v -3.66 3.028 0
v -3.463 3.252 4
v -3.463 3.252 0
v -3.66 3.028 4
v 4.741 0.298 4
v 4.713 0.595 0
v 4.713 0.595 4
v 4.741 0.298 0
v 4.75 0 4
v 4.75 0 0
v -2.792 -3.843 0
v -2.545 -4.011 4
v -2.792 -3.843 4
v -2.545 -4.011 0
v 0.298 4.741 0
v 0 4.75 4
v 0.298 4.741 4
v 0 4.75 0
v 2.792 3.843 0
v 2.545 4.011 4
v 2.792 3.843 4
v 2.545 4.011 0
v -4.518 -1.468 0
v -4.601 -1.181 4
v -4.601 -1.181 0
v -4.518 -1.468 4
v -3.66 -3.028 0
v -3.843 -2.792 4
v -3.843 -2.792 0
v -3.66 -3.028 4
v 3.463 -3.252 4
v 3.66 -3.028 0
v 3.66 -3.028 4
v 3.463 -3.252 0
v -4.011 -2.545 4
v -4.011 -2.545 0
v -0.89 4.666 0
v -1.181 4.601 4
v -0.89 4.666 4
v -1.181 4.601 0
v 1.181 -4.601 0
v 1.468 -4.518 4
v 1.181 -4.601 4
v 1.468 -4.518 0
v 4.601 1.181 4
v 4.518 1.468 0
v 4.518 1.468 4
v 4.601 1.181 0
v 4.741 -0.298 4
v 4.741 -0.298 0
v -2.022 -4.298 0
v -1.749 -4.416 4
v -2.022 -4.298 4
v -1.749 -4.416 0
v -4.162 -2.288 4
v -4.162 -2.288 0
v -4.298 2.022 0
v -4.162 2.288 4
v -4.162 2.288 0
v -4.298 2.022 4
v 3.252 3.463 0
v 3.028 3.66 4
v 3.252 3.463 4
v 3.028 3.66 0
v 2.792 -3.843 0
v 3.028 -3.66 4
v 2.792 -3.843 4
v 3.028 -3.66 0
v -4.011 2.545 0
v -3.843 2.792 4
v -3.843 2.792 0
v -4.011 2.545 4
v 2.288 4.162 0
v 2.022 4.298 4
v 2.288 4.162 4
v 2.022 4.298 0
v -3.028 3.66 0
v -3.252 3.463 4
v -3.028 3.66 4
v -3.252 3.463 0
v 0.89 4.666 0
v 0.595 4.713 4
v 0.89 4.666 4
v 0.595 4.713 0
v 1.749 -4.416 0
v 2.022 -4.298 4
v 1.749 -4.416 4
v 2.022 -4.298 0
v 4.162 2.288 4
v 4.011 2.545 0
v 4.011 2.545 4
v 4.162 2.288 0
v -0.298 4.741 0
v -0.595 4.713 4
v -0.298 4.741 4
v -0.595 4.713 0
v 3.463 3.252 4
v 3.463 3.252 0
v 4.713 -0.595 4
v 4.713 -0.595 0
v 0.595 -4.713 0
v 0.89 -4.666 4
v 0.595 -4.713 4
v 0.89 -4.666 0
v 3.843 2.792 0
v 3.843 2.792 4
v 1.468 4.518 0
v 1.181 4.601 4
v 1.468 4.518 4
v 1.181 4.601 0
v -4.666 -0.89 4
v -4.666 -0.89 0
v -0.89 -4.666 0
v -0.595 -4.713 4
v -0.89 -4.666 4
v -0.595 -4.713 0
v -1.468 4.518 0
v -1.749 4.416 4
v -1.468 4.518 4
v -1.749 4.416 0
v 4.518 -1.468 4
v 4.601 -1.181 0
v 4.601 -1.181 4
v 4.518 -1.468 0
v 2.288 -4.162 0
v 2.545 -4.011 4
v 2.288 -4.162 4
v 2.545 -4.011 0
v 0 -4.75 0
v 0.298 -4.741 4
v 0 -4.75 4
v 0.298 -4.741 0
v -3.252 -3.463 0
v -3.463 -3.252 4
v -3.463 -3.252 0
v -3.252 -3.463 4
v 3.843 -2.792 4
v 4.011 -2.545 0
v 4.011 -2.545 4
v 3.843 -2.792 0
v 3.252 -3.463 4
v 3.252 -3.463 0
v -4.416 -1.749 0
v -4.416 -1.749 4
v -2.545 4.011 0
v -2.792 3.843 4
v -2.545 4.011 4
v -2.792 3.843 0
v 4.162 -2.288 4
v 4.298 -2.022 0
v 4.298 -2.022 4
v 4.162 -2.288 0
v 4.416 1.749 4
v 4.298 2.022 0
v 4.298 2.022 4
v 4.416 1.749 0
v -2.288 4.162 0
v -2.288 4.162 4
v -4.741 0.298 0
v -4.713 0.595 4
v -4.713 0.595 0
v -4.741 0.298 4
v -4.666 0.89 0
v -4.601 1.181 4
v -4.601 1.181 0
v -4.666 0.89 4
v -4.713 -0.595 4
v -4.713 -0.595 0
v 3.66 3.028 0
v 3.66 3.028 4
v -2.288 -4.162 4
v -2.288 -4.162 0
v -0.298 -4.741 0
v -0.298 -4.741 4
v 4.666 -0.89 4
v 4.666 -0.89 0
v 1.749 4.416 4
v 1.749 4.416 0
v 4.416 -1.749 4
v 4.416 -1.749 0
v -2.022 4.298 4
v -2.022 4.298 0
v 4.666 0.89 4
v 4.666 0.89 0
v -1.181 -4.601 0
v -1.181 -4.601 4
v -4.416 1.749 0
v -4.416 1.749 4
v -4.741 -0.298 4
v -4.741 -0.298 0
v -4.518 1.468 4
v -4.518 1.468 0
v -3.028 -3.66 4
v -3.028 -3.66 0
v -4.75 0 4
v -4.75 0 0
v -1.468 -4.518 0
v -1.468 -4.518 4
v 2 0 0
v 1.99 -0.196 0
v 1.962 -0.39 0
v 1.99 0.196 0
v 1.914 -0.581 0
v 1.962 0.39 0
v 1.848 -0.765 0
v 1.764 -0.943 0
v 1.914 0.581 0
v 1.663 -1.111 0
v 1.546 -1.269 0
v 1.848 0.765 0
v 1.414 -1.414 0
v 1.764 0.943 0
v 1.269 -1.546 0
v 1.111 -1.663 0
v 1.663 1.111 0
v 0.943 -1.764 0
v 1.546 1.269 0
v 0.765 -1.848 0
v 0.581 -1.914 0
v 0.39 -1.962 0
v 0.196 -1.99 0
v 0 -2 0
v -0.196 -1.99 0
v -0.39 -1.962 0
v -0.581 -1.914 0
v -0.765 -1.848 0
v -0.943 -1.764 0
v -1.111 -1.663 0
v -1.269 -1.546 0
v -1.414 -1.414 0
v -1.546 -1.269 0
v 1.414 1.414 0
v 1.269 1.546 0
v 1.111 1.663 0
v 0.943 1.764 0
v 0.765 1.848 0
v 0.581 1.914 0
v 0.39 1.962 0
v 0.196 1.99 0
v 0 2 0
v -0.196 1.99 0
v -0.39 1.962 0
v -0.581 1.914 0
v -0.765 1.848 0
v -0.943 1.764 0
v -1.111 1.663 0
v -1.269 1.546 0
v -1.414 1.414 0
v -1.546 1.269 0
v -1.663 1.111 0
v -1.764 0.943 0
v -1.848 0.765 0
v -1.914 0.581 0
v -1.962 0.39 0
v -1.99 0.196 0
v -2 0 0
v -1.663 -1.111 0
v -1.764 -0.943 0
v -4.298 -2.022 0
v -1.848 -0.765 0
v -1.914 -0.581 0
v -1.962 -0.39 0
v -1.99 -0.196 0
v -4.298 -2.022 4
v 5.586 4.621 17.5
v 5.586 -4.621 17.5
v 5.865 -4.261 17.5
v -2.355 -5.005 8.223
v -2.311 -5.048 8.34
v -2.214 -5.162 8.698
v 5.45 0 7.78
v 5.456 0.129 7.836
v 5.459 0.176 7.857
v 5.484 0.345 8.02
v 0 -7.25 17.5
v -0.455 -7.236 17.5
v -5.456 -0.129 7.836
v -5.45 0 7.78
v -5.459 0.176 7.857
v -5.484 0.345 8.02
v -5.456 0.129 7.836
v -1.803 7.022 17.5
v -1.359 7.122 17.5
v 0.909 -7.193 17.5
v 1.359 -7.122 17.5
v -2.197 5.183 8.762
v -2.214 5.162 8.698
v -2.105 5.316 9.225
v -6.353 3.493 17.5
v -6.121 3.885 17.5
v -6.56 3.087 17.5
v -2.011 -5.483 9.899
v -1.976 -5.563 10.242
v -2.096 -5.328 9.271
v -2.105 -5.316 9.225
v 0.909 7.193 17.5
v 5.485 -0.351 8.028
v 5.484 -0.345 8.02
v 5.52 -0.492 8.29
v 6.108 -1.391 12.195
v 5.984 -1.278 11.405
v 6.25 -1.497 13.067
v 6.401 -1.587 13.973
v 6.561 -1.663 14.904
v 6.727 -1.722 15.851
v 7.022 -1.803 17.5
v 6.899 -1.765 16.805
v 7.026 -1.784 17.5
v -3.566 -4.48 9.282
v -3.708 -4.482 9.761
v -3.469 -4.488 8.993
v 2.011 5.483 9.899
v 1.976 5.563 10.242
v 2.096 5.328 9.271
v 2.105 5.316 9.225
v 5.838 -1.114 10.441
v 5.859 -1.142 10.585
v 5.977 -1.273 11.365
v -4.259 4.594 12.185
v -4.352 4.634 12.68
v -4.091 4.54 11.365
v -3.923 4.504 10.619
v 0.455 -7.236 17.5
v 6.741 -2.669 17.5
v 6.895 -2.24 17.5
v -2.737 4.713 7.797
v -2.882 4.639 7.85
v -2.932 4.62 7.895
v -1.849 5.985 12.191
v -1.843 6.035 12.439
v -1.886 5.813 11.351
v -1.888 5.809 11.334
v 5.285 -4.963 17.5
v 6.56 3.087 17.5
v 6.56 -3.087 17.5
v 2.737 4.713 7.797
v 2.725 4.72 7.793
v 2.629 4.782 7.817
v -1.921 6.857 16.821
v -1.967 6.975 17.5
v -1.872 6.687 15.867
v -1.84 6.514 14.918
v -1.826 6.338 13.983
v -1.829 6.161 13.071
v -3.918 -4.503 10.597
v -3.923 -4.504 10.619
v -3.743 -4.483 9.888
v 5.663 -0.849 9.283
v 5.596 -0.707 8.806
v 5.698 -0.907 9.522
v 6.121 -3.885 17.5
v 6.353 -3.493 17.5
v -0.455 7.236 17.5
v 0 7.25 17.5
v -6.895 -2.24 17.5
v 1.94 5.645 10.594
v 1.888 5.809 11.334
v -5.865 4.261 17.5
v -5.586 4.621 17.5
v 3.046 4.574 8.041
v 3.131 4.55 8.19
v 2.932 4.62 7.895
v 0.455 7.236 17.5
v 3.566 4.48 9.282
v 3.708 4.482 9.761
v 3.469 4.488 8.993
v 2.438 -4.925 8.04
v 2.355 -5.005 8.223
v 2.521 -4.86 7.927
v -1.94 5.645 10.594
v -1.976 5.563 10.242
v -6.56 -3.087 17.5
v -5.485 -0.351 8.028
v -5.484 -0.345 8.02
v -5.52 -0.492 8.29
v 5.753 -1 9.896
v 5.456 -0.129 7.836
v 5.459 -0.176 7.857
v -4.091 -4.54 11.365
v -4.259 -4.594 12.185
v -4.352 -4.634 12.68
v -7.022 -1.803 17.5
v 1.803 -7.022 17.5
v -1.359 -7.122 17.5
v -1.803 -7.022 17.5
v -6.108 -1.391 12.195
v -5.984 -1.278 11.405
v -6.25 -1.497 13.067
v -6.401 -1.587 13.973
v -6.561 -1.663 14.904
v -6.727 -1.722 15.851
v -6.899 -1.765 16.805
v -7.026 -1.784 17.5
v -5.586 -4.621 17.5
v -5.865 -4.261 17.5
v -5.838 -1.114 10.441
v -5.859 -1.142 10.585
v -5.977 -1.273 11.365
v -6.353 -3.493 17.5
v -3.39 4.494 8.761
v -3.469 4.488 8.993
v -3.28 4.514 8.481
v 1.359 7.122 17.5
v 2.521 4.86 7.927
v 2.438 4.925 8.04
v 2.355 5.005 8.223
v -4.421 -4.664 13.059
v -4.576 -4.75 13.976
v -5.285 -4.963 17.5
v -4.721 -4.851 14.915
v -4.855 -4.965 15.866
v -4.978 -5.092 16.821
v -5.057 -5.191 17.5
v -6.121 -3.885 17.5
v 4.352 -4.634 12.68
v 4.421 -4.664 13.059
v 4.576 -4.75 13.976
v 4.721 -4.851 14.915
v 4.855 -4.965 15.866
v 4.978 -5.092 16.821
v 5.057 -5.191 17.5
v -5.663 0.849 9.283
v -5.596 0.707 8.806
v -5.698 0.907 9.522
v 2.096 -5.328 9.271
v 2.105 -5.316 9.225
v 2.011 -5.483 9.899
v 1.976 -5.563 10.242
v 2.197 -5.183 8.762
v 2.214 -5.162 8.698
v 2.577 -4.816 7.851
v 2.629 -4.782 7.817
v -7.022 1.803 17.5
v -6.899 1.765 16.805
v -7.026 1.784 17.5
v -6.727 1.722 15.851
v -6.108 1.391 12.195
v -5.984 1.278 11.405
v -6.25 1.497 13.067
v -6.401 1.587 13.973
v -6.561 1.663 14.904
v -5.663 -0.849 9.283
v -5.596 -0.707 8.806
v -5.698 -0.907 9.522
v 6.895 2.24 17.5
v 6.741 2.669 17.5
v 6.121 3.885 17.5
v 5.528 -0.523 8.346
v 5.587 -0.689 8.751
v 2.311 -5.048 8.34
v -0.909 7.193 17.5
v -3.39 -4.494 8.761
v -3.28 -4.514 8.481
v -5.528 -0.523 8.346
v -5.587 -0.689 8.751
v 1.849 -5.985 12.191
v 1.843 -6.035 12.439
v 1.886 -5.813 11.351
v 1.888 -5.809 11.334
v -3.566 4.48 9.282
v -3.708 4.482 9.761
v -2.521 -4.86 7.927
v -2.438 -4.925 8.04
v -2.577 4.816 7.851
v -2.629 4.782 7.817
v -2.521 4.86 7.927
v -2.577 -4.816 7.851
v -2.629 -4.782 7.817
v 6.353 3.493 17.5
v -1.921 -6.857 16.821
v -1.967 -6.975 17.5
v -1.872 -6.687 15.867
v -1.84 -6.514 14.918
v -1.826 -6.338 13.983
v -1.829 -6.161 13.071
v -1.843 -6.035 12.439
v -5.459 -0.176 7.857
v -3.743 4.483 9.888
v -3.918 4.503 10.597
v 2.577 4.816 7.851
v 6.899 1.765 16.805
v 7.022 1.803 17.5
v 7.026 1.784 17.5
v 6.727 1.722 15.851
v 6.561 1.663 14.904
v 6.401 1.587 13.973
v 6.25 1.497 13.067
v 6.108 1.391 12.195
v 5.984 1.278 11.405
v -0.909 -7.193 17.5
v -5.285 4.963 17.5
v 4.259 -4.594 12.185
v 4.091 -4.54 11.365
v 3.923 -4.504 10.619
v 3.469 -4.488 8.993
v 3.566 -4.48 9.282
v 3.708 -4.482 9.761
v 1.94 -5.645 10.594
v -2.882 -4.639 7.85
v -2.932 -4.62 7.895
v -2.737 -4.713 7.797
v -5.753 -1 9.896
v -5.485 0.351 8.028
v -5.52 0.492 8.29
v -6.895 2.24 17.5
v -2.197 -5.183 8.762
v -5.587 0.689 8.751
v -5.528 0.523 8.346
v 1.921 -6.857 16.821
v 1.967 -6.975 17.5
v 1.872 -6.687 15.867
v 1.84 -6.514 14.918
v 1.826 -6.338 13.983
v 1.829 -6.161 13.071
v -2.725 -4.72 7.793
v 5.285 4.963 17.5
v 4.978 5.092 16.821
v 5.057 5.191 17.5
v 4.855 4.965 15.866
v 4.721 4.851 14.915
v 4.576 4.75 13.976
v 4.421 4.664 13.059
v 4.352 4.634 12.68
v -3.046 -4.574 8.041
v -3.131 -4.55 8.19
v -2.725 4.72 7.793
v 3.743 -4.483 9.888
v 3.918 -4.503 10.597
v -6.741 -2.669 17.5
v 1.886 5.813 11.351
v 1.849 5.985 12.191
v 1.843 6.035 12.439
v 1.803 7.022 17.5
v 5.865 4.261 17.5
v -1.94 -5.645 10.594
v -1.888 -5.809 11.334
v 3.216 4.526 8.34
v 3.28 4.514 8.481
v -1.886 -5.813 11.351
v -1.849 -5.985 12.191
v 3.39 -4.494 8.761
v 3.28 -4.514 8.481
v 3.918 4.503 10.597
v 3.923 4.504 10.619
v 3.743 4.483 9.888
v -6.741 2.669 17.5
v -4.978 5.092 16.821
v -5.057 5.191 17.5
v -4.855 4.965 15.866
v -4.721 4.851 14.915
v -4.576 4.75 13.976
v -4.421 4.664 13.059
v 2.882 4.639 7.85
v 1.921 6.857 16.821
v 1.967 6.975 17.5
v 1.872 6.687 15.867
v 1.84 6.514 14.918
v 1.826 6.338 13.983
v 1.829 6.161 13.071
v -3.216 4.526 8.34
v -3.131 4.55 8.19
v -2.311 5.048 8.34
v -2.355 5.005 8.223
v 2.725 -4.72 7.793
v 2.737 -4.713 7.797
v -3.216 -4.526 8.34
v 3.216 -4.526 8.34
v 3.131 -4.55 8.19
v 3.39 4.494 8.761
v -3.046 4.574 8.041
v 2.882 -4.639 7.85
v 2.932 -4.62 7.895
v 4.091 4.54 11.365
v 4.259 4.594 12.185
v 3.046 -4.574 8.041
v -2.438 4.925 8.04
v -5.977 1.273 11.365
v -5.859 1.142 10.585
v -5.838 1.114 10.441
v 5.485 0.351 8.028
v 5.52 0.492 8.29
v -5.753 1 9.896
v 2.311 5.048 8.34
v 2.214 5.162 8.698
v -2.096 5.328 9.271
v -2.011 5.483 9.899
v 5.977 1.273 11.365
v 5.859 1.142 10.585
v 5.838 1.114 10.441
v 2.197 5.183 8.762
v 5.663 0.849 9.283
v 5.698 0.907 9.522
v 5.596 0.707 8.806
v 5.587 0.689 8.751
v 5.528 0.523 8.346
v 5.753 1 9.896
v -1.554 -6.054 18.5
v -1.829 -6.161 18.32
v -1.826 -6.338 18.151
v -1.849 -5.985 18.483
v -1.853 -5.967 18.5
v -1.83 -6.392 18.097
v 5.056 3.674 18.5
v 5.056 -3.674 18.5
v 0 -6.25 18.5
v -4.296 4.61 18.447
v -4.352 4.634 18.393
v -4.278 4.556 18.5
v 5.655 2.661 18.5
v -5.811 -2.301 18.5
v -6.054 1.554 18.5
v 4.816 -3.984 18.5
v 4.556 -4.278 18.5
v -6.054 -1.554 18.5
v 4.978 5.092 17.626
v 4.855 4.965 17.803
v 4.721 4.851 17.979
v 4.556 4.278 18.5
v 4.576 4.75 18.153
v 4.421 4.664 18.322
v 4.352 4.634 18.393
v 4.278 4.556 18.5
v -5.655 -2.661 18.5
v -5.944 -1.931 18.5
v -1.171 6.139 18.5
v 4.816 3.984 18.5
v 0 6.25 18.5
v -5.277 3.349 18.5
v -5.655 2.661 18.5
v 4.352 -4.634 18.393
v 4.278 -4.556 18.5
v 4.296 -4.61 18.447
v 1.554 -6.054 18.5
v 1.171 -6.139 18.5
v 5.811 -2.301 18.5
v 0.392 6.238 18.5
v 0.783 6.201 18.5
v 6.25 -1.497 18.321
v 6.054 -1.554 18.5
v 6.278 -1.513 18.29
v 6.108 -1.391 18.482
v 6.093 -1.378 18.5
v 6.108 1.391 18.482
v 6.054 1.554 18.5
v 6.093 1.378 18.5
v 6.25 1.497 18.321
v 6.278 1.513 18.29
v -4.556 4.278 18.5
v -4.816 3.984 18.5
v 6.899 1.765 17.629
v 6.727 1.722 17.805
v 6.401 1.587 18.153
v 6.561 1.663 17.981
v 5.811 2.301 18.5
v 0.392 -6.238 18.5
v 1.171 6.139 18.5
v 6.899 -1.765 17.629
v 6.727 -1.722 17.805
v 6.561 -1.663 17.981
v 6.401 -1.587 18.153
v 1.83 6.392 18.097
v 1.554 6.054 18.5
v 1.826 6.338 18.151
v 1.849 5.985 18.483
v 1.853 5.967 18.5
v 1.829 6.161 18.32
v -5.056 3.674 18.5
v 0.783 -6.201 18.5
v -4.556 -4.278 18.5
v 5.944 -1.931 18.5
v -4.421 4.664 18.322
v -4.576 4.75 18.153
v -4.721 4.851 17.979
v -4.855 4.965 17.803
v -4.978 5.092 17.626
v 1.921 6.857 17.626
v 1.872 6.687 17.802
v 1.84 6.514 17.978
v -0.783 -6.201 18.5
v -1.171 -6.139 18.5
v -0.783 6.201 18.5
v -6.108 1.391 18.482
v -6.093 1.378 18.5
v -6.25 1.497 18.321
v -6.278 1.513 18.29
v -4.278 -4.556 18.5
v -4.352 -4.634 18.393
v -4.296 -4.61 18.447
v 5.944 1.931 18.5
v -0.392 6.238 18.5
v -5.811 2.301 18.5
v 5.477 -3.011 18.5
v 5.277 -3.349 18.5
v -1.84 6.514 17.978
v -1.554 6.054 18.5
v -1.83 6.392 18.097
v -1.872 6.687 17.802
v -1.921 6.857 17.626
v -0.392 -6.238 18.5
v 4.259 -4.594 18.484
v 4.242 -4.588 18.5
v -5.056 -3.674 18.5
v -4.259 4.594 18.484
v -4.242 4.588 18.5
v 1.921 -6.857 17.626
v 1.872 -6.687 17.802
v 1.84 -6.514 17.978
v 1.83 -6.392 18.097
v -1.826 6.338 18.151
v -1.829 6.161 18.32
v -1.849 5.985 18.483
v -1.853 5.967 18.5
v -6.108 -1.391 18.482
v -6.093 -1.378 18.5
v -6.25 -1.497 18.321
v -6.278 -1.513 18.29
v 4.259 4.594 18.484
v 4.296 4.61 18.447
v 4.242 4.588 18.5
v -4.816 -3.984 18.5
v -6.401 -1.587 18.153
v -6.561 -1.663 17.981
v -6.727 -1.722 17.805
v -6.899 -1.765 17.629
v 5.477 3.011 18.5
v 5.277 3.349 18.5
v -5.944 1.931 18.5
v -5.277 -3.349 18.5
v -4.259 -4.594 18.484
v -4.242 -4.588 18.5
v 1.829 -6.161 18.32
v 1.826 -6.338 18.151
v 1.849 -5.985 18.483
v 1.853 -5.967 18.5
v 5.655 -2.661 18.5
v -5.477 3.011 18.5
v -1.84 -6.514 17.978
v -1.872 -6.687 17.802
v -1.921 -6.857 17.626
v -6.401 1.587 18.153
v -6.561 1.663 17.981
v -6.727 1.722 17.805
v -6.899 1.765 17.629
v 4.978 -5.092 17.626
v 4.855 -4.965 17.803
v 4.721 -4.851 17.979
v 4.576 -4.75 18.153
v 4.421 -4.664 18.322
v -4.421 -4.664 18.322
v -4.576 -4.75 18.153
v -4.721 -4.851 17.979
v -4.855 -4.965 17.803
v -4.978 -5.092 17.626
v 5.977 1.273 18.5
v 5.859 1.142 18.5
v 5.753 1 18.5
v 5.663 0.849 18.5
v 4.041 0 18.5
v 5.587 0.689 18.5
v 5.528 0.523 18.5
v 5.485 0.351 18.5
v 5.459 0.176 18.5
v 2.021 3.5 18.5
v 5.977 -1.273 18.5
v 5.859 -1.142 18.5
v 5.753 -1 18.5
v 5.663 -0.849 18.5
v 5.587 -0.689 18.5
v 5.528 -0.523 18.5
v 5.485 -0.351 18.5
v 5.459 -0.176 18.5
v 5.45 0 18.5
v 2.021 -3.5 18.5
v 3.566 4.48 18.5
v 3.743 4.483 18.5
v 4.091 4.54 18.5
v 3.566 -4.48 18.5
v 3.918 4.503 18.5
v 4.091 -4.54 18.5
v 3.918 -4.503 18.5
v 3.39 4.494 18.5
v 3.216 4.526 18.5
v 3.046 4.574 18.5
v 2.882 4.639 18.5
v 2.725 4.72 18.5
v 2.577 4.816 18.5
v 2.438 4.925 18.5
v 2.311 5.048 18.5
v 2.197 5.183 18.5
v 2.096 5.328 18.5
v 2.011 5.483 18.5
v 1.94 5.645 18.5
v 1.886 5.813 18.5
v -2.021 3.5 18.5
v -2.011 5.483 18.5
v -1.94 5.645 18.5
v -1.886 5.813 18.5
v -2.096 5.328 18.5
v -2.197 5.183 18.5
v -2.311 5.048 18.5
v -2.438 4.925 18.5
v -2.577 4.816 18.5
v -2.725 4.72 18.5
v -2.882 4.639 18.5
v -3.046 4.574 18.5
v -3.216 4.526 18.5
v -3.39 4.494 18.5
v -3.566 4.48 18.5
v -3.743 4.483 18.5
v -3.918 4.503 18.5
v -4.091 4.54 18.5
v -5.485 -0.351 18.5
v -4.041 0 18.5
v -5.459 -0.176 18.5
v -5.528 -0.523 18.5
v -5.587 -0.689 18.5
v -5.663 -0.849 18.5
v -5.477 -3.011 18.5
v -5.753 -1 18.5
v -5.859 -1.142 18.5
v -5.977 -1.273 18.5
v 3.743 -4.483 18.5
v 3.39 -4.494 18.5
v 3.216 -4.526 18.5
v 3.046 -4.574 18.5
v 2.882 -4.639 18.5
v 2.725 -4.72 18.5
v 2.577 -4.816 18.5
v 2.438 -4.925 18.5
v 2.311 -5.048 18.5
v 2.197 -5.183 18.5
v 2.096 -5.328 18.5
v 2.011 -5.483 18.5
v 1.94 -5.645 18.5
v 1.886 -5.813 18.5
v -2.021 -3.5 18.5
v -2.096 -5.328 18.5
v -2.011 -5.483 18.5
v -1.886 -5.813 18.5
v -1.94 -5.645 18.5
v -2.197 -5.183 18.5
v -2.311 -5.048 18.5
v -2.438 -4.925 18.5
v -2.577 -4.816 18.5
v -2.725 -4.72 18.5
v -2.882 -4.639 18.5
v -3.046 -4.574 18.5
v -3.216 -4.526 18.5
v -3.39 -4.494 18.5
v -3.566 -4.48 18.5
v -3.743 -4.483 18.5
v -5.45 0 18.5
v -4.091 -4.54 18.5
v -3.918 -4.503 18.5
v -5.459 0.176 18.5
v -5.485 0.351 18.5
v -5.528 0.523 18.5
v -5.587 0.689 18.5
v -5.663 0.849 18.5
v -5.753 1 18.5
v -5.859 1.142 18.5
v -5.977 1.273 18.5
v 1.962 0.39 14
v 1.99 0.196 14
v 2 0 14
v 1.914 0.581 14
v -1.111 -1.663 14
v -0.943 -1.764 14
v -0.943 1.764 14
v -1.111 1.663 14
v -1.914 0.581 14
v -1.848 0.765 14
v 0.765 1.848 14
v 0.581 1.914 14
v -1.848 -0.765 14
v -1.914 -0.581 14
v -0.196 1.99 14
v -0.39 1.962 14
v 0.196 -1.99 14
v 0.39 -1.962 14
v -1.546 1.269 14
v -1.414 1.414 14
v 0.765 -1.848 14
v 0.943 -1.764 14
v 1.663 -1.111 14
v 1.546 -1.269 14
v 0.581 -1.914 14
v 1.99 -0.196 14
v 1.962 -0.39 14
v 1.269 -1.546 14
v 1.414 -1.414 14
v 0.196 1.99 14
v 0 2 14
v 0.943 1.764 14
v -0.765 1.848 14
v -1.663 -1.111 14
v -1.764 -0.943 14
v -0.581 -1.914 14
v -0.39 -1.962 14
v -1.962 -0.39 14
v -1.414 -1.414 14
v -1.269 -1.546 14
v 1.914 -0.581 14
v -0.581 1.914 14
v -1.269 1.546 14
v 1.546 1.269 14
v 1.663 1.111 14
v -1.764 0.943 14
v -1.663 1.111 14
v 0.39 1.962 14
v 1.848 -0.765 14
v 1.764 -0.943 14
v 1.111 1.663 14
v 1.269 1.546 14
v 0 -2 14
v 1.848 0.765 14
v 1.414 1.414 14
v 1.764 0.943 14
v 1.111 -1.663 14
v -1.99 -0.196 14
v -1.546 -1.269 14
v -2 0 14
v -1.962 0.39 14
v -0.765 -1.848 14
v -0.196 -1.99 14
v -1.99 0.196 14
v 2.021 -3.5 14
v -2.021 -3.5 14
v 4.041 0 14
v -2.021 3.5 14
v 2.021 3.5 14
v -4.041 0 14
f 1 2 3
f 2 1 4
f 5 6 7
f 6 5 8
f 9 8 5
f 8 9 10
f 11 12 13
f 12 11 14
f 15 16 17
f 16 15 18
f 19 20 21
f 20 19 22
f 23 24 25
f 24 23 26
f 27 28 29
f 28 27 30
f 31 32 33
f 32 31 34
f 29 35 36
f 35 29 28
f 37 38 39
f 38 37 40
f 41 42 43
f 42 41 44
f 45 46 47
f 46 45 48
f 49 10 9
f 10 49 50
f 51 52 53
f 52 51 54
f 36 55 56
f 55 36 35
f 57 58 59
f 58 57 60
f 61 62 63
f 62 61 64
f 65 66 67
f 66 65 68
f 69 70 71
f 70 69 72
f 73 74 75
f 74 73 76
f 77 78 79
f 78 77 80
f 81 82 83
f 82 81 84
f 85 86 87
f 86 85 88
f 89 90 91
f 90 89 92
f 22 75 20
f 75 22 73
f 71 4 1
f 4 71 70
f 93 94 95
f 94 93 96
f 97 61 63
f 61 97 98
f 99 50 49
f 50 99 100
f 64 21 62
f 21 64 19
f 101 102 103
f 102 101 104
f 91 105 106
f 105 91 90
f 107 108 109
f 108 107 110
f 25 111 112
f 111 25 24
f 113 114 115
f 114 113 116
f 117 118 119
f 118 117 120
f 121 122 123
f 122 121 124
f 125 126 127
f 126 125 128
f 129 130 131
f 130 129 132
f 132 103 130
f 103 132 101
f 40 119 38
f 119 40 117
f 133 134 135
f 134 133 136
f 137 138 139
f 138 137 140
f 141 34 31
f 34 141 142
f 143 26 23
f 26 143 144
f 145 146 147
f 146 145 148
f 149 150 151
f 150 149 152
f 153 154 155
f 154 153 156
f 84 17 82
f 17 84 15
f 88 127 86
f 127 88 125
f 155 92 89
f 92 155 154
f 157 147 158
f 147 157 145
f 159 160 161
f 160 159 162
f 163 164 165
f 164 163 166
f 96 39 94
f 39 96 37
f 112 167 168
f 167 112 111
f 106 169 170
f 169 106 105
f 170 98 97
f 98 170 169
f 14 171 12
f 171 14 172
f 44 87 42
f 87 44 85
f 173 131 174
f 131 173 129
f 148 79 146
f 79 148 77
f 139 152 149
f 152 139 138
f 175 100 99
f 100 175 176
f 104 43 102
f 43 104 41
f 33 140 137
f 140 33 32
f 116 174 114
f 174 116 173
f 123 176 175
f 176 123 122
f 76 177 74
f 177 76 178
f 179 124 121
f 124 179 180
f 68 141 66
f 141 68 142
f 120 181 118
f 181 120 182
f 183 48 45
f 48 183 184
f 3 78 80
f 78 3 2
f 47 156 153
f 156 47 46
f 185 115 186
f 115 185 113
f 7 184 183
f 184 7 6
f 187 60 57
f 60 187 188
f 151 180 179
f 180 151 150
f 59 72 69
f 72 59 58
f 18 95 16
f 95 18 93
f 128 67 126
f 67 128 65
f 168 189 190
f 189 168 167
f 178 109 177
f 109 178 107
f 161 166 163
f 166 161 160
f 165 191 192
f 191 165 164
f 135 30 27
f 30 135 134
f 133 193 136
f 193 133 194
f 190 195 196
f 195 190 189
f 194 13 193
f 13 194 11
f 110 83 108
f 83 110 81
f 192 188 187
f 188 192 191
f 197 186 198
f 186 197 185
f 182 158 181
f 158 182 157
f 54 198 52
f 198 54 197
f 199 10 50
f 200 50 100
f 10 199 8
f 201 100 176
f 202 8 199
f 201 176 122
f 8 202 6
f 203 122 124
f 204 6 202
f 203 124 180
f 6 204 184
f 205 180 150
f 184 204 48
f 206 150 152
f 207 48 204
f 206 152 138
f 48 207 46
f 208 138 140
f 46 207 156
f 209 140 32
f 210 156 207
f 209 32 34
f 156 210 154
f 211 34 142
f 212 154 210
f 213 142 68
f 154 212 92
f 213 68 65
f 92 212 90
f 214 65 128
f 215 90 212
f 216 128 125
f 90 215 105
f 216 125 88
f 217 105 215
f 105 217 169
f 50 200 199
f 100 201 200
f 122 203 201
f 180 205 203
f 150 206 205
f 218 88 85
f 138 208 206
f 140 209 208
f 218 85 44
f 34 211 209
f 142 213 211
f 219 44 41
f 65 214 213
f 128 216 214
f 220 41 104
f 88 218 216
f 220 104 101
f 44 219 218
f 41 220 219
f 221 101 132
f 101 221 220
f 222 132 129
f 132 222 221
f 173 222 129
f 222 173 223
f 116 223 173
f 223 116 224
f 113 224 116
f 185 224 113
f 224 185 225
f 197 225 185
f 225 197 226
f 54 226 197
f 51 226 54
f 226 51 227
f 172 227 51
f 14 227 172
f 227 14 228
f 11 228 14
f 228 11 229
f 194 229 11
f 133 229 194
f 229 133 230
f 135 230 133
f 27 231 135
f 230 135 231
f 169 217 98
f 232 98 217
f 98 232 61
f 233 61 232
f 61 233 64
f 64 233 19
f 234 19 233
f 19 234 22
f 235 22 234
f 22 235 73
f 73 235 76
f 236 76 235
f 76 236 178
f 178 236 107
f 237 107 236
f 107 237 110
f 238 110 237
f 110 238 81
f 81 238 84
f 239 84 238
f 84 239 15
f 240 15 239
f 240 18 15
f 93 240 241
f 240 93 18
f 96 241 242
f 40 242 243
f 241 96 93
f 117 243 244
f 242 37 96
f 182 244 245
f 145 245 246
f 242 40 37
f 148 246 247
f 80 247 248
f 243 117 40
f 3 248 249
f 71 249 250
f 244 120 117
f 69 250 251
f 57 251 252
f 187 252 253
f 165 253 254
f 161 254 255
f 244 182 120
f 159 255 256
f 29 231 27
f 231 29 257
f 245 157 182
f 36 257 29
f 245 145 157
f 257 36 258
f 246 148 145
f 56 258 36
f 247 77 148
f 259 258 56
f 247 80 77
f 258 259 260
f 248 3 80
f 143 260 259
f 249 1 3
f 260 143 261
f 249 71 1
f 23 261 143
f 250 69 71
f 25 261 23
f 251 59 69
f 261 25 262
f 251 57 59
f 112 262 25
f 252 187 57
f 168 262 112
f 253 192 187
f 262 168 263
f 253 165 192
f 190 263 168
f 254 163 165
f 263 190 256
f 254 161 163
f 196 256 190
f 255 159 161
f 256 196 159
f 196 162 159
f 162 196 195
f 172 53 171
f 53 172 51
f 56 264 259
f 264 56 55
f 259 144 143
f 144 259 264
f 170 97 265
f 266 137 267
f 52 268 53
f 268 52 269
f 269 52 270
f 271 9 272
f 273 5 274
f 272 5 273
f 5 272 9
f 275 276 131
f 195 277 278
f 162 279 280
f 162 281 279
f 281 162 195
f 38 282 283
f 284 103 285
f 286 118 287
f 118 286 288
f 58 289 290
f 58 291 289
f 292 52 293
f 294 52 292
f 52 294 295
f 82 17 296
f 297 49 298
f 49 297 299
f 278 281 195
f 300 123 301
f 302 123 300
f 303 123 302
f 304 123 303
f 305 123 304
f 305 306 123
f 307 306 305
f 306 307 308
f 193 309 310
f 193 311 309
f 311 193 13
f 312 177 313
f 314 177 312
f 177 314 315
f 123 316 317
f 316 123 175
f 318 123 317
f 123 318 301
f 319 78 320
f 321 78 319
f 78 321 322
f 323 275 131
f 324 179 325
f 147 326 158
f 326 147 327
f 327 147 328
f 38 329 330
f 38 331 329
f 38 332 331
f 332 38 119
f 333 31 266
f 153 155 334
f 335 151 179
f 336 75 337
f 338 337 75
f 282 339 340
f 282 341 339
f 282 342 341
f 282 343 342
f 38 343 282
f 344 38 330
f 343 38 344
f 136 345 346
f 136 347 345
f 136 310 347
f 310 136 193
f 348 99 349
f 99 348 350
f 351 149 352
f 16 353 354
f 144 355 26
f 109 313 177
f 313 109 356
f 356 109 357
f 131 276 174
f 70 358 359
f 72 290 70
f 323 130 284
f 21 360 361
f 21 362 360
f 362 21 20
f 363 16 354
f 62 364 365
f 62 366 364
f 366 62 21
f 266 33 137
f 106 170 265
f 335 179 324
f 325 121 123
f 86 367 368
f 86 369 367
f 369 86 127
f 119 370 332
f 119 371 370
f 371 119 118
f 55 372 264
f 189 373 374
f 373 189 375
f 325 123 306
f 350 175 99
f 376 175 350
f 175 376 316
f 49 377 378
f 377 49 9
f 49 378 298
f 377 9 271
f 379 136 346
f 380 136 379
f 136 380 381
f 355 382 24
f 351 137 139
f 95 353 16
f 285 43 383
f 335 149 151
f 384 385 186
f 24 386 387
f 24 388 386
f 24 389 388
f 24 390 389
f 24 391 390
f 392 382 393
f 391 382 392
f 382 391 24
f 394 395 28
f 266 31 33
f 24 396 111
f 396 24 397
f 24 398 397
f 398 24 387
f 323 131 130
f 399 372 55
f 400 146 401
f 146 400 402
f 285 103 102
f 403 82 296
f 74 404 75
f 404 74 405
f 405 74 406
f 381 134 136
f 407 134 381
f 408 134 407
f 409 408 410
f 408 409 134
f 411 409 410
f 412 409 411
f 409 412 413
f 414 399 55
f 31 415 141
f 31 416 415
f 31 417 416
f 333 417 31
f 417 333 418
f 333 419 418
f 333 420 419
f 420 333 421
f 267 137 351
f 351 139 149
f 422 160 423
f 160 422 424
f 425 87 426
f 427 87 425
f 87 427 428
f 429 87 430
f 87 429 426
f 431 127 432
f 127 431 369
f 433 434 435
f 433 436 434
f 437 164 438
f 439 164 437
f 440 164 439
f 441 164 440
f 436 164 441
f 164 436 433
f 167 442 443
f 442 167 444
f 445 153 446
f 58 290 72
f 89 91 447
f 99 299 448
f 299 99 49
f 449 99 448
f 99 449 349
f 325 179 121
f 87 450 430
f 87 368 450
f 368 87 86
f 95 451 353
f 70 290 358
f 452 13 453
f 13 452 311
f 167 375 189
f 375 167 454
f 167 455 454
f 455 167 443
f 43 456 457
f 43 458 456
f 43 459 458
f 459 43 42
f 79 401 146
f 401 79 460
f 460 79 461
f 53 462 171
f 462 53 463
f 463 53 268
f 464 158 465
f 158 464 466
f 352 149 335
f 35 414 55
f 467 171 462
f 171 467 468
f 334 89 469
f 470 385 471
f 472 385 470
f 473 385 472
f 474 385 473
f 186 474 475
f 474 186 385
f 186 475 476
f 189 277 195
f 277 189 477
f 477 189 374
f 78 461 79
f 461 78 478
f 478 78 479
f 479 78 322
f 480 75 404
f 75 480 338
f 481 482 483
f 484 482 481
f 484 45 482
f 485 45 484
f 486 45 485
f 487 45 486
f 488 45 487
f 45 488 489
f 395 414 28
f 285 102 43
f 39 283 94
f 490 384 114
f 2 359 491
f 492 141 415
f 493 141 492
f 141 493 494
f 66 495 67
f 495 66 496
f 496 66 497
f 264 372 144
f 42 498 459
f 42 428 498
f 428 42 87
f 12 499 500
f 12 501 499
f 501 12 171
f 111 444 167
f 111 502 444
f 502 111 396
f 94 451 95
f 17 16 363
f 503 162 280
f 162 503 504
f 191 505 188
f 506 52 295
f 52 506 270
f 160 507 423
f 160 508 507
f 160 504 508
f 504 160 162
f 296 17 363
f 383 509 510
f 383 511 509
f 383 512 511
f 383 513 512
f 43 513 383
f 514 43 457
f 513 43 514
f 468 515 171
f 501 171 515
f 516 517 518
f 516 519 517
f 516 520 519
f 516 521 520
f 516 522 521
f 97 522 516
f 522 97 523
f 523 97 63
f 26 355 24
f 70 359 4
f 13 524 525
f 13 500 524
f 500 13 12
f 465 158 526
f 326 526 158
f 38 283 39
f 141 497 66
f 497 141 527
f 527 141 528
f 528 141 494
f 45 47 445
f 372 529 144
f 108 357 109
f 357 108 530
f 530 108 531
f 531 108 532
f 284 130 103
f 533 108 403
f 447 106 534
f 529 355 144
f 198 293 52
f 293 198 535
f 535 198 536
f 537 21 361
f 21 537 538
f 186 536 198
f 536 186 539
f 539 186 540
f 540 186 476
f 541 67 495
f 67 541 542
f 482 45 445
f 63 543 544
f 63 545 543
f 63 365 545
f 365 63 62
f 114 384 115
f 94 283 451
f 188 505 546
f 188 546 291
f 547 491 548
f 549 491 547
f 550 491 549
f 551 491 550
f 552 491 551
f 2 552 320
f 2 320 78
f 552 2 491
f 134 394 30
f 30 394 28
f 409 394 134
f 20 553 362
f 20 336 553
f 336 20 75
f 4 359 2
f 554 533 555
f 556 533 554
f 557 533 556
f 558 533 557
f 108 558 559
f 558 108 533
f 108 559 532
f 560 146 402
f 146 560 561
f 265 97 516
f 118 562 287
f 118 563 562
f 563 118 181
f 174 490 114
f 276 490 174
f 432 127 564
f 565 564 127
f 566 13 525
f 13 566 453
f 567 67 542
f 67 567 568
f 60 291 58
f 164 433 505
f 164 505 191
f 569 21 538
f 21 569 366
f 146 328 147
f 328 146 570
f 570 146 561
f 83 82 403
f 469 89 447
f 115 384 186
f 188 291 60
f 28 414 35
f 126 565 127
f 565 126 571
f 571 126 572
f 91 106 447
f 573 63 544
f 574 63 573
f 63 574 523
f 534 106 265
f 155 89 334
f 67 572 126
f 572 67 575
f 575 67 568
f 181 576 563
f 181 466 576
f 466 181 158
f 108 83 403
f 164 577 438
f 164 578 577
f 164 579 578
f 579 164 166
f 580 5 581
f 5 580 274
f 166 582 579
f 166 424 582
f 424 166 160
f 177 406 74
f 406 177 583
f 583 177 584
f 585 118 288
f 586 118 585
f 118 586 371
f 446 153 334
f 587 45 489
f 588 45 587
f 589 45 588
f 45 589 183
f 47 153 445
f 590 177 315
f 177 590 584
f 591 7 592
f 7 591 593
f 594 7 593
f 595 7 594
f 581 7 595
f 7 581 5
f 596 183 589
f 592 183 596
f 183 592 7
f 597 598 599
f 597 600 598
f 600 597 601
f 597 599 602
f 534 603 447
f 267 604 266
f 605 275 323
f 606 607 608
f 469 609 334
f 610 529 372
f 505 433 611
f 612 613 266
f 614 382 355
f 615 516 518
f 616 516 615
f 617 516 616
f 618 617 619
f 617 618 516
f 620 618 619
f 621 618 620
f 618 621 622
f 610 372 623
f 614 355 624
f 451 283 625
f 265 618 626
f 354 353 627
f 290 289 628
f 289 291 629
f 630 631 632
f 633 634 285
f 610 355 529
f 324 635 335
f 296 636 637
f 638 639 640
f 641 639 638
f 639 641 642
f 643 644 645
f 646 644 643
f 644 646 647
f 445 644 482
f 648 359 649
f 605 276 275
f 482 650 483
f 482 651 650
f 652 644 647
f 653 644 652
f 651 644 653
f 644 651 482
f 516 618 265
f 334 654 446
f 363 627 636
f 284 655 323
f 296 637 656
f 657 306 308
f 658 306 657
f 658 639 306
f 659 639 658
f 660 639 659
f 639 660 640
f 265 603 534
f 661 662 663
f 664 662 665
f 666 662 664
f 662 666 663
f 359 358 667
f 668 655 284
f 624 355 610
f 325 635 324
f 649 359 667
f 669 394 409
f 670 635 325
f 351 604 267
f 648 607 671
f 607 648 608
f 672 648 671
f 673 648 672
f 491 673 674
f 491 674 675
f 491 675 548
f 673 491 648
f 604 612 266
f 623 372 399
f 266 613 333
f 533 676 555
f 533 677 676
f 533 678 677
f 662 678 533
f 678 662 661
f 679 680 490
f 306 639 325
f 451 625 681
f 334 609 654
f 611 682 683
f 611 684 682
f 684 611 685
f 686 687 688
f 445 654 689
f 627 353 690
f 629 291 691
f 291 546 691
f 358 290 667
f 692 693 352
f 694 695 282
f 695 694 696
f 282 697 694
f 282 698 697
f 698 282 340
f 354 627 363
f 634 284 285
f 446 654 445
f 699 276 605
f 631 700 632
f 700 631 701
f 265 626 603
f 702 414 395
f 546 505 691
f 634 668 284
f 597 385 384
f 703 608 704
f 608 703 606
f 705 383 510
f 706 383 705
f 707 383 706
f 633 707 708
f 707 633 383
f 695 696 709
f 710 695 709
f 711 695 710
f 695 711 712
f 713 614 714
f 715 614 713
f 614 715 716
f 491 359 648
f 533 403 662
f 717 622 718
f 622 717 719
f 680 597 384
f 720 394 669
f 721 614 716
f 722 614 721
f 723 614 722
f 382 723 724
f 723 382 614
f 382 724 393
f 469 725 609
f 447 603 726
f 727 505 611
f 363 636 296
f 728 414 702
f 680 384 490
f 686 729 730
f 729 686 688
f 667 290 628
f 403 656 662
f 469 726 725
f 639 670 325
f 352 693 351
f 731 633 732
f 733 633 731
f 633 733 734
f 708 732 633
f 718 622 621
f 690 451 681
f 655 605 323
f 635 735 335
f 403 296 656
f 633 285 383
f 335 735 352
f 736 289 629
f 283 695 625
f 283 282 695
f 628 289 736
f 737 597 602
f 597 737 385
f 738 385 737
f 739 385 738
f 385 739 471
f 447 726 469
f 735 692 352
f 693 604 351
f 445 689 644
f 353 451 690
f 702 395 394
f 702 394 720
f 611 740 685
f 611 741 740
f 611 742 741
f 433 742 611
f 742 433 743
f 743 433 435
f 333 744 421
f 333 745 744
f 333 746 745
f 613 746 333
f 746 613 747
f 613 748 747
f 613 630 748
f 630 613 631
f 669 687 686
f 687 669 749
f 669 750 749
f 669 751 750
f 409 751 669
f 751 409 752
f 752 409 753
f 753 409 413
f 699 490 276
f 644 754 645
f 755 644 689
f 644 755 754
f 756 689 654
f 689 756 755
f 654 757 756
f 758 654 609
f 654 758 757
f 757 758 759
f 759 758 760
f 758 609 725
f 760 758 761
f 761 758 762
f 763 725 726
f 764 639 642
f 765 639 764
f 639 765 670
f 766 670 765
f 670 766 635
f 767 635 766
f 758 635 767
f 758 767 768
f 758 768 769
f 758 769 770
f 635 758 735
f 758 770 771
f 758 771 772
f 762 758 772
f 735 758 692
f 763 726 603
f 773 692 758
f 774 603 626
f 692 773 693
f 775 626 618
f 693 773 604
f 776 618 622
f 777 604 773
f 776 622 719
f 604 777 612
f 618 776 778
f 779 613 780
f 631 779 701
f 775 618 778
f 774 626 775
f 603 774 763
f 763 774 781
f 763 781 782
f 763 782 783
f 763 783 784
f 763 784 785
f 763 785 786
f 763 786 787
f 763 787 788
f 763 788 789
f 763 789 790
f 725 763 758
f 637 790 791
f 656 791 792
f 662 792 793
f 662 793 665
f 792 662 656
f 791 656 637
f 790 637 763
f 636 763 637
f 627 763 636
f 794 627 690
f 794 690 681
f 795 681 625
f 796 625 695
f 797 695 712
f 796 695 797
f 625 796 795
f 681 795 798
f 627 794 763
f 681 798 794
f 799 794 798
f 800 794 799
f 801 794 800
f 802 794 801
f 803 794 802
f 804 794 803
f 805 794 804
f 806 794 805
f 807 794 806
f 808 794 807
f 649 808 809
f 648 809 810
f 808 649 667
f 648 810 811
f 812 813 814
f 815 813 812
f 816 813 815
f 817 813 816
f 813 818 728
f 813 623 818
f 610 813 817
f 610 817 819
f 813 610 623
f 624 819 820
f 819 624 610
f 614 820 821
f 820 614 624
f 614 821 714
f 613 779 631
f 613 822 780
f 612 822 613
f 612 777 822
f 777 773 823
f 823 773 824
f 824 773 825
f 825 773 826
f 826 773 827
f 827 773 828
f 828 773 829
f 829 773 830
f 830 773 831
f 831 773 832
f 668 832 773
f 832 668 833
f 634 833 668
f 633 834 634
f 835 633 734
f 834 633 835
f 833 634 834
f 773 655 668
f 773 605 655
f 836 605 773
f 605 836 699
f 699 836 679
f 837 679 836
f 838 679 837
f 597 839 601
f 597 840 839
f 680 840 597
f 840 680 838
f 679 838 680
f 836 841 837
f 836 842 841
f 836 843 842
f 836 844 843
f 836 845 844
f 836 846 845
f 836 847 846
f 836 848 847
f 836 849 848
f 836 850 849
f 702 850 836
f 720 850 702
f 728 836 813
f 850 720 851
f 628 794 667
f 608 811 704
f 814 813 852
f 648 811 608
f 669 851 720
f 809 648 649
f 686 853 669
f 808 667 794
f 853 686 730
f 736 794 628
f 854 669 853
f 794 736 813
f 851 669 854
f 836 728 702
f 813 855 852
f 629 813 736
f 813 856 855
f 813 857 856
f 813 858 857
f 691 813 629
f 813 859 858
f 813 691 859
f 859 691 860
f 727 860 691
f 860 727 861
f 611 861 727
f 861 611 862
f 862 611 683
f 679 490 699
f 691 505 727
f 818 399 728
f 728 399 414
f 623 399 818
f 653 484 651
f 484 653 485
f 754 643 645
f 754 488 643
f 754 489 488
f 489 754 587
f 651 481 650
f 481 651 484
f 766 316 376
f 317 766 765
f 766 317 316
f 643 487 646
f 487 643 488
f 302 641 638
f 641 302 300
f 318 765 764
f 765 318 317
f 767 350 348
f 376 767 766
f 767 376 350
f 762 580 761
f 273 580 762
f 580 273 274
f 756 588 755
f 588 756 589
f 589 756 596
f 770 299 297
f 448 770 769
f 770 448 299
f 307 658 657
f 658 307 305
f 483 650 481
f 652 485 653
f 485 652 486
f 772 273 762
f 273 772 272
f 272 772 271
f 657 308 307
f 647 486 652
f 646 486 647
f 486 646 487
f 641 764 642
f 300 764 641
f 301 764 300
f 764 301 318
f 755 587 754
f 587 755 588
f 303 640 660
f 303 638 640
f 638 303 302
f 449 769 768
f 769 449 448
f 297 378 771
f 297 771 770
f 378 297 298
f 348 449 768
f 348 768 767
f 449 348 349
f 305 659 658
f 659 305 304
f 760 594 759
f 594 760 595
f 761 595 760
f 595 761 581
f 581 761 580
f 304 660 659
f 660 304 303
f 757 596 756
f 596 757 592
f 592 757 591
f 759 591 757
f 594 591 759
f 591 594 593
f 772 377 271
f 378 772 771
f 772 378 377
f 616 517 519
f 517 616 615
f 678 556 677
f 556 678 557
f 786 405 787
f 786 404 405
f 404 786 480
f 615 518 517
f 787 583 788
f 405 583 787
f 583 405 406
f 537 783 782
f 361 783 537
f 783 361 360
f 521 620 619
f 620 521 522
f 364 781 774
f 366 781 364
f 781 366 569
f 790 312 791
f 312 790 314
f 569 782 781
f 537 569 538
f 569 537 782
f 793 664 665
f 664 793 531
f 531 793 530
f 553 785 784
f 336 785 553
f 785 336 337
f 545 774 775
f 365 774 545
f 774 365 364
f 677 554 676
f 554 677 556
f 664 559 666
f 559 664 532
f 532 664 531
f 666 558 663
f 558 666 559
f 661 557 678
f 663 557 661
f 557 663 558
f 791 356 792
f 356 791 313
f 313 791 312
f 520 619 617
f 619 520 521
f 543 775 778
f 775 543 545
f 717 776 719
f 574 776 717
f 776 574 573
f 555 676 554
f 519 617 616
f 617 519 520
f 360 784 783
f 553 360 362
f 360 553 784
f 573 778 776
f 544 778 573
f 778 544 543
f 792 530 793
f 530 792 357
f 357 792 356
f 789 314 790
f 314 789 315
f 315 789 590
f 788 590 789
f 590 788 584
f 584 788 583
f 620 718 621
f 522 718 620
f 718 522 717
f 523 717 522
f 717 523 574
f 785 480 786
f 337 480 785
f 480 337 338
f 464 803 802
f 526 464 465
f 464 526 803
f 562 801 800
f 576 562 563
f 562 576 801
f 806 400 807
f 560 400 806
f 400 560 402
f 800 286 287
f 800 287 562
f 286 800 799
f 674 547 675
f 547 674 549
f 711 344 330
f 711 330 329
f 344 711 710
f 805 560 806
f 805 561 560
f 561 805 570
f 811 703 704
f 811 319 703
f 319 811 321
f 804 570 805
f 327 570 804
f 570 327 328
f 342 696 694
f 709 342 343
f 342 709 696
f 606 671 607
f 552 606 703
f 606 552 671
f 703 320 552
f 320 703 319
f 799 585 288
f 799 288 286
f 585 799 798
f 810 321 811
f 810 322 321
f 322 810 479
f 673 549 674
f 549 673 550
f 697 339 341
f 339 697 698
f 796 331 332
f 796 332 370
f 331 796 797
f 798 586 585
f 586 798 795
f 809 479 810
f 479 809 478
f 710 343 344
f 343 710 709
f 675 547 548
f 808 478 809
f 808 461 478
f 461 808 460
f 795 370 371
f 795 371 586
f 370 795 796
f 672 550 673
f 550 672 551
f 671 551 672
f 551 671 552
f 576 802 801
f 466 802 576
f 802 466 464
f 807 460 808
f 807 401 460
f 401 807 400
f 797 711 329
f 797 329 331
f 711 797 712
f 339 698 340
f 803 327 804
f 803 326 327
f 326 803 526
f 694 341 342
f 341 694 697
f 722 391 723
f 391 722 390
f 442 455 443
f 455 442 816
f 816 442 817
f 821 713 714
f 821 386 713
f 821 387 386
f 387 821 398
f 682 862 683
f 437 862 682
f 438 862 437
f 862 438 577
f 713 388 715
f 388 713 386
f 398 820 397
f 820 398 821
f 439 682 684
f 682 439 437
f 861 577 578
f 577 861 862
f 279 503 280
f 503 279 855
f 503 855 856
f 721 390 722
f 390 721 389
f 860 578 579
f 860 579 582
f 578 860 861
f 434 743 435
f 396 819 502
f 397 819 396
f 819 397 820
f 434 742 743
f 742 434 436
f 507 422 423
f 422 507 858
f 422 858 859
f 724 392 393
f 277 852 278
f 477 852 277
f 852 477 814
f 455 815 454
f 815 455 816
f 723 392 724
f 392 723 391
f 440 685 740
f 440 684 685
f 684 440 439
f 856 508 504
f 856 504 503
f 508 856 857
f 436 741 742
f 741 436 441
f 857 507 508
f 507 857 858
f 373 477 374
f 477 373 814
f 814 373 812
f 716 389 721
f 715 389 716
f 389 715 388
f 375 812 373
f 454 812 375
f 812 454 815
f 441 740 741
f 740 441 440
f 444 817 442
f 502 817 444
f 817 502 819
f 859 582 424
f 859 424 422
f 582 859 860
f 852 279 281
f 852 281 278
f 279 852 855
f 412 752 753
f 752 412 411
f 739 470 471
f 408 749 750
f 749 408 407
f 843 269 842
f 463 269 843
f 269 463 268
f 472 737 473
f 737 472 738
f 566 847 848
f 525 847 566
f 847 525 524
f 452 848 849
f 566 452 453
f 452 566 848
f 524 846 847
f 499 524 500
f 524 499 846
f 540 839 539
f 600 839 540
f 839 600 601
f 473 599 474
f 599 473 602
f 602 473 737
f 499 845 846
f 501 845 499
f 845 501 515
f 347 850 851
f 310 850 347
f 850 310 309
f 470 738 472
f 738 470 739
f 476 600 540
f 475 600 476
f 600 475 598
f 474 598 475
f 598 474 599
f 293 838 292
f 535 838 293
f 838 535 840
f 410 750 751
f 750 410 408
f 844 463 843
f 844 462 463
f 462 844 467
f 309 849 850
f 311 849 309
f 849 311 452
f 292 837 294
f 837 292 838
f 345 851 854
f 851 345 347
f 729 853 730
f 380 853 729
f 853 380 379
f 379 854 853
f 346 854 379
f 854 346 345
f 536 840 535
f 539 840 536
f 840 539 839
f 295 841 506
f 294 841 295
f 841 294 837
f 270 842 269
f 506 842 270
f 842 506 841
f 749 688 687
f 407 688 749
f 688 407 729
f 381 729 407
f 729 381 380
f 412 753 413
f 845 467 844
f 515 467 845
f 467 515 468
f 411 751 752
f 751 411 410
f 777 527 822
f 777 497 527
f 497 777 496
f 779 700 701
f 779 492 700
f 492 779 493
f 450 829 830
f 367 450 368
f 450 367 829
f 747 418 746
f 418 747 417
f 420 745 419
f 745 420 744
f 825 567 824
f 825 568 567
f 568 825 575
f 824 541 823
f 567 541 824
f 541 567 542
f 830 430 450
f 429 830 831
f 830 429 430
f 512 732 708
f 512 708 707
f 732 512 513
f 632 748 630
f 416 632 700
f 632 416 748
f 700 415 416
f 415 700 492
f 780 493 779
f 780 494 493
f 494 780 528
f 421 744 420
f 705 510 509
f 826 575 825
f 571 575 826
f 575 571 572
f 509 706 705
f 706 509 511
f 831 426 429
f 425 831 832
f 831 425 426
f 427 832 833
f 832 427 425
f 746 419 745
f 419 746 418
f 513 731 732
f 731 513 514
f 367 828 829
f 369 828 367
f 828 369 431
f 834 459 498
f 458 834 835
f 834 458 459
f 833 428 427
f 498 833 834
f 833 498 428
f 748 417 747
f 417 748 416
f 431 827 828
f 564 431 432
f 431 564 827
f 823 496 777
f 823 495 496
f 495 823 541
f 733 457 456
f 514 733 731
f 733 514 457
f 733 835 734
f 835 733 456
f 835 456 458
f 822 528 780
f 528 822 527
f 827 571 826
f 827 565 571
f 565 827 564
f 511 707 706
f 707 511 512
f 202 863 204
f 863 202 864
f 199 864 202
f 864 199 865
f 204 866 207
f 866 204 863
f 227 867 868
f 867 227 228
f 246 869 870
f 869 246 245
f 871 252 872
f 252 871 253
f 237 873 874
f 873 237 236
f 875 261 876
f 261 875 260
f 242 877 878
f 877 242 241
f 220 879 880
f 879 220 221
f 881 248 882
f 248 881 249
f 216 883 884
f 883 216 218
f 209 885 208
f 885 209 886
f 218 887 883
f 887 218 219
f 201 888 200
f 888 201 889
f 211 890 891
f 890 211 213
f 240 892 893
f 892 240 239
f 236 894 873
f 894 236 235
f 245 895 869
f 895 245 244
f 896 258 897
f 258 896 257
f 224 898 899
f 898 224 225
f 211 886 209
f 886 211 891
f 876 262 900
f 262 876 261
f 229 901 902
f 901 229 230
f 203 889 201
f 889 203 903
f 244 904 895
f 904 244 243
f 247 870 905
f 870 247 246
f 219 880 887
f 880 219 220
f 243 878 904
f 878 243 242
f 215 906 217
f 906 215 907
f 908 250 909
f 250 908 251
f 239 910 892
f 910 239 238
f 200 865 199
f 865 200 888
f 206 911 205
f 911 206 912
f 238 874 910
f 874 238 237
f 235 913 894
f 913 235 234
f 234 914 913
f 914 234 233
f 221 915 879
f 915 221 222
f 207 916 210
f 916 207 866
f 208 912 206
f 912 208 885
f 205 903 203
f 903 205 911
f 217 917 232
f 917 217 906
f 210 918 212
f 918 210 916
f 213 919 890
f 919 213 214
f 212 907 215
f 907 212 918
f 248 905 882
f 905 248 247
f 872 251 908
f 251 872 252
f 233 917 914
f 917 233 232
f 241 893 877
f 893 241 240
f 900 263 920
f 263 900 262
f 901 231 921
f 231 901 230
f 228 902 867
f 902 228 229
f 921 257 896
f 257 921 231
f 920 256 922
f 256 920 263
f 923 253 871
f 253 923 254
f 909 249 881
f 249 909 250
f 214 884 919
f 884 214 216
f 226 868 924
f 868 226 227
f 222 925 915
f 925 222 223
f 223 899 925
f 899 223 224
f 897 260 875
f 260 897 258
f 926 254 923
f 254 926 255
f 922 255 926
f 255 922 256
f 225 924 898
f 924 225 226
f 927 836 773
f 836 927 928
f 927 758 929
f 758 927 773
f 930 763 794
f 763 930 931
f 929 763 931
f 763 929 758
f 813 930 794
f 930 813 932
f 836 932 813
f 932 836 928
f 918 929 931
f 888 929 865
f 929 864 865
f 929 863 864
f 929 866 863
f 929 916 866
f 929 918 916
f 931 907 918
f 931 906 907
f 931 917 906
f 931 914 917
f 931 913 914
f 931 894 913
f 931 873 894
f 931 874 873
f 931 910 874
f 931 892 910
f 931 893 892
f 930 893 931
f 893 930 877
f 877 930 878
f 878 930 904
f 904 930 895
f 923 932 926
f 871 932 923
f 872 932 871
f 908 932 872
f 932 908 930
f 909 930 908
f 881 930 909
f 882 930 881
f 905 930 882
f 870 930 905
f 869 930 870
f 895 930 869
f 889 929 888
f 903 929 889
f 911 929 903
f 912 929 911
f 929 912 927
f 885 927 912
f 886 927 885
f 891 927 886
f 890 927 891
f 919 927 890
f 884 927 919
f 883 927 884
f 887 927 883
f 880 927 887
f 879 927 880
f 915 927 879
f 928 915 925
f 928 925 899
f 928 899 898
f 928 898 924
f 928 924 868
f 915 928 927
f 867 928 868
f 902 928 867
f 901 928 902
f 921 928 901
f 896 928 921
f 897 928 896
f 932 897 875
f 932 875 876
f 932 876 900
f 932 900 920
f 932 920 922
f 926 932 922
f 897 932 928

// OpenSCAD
// =========================================================================
// IKEA-BROGRUND-Battery-Knob.scad
//
// Parametric thumb knob replacement for the IKEA BROGRUND battery box lid.
// Replaces the awkward internal hex socket bolt with an easy-to-turn knob
// using a standard M4 hex head bolt (M4x30, with 16mm protruding).
//
// Version History:
//   v0.01 (2026-07-10) - Initial release. Robust parametric design with
//                        ergonomic flutes, automatic height checking, and
//                        an optional printable hex-socket cap.
//
// Printing Instructions:
//   - Material: PETG or PLA (PETG is recommended for durability and flex).
//   - Orientation: Print the knob standing upright on its flat bottom face.
//                  Print the cap flat-face down (stem pointing upwards).
//   - Supports: None needed! The internal bridging and outer flare angles
//               are optimized for support-free printing.
//   - Infill: 30% to 50% (Gyroid or Grid) for strength.
//   - Walls/Perimeters: 3 or 4 to ensure the hex socket is extremely strong.
//
// Assembly:
//   1. Insert the M4x30 hex head bolt from the top of the knob.
//   2. Pull or press the bolt head into the hexagonal socket until it seats.
//      (If tight, you can screw a nut on the protruding end to pull it in).
//   3. (Optional) Press-fit the cap into the top of the knob to hide the bolt head.
// =========================================================================

/* [Output Selection] */
// Select which part to render: "knob" for the main knob, "cap" for the bolt-head cover, or "both" to print side-by-side.
part = "knob"; // ["knob", "cap", "both"]

/* [Bolt Dimensions] */
// Total length of the M4 bolt shank (under the head), in mm
bolt_length = 30.0; // [20:1:50]

// Desired length of the bolt thread protruding from the bottom of the knob, in mm
bolt_protrusion = 16.0; // [5:1:40]

// Width across flats for the M4 hex head (standard is 7.0mm)
hex_flat_width = 7.0;

// Height of the hex head (standard is 2.8mm, we use 3.0 for printing tolerance)
hex_head_height = 3.0;

// Clearance around the hex head for a snug fit, in mm
hex_clearance = 0.0;

// Clearance around the bolt shank, in mm
shaft_clearance = 0.0;

/* [Knob Profile] */
// Maximum outer diameter of the knob (must not exceed 15.0mm for battery box clearances!)
knob_max_diameter = 14.5; // [10:0.5:15]

// Neck diameter at the bottom of the knob to fit into lid recesses, in mm
knob_neck_diameter = 9.5; // [8:0.5:14]

// Height of the narrow neck part, in mm
knob_neck_height = 4.0; // [0:1:10]

// Total height of the knob (must be at least bolt_length - bolt_protrusion + hex_head_height + 1), in mm
knob_total_height = 18.5; // [15:0.5:30]

// Size of the chamfer/bevel at the top edge, in mm
top_bevel_size = 1.0; // [0:0.1:3]

/* [Ergonomic Grip] */
// Number of finger grooves around the perimeter (0 to disable fluting)
num_grooves = 6; // [0:1:12]

// Radius of each vertical groove cylinder, in mm
groove_radius = 1.8; // [0.5:0.1:4]

// Depth adjustment of the grooves (0 is flush with outer radius, negative is deeper, positive is shallower)
groove_depth_offset = 0.0; // [-2:0.1:2]


// =========================================================================
// CALCULATED PROPERTIES & SAFETY OVERRIDES
// =========================================================================

// Depth of the central shaft hole through which the bolt shank passes
shaft_hole_depth = bolt_length - bolt_protrusion;

// Enforce a minimum knob height so the bolt head does not stick out of the top
min_required_height = shaft_hole_depth + hex_head_height + 1.0;
effective_knob_height = max(knob_total_height, min_required_height);

// Diagnostics Console Output
echo("--- IKEA BROGRUND Battery Knob Parametric Model ---");
echo(str("Bolt Length: ", bolt_length, " mm"));
echo(str("Required Protrusion: ", bolt_protrusion, " mm"));
echo(str("Calculated Internal Shaft Depth: ", shaft_hole_depth, " mm"));
if (knob_total_height < min_required_height) {
    echo(str("WARNING: Requested knob height (", knob_total_height, " mm) is too small!"));
    echo(str("-> Automatically adjusted height to ", effective_knob_height, " mm to accommodate bolt head and shoulder."));
} else {
    echo(str("Effective Knob Height: ", effective_knob_height, " mm"));
}
if (knob_max_diameter > 15.0) {
    echo("WARNING: Knob diameter exceeds 15mm! Ensure it fits your BROGRUND battery box lid clearance.");
}

// =========================================================================
// MAIN GENERATOR
// =========================================================================

if (part == "knob") {
    battery_knob();
} else if (part == "cap") {
    battery_knob_cap();
} else if (part == "both") {
    // Render both side-by-side with a clean offset for printing
    translate([-knob_max_diameter * 0.7, 0, 0])
        battery_knob();
    translate([knob_max_diameter * 0.7, 0, 0])
        battery_knob_cap();
}

// =========================================================================
// MODULES
// =========================================================================

// The main thumb-knob body
module battery_knob() {
    // Width across corners of hex head for OpenSCAD's 6-sided cylinder
    hex_w = hex_flat_width + 2 * hex_clearance;
    hex_r = (hex_w / 2) / cos(30);

    // Bolt shank diameter with clearance
    bolt_hole_diameter = 4.0 + 2 * shaft_clearance;

    difference() {
        // --- 1. SOLID KNOB OUTER SHAPE ---
        union() {
            // A. Bottom neck section (straight cylinder)
            cylinder(h = knob_neck_height, r = knob_neck_diameter / 2, $fn = 100);

            // B. Transition/flared section (conical)
            transition_height = effective_knob_height - knob_neck_height - top_bevel_size;
            translate([0, 0, knob_neck_height])
                cylinder(h = transition_height, r1 = knob_neck_diameter / 2, r2 = knob_max_diameter / 2, $fn = 100);

            // C. Beveled top section (conical bevel)
            translate([0, 0, effective_knob_height - top_bevel_size])
                cylinder(h = top_bevel_size, r1 = knob_max_diameter / 2, r2 = knob_max_diameter / 2 - top_bevel_size, $fn = 100);
        }

        // --- 2. BOLT SHANK THROUGH-HOLE ---
        translate([0, 0, -1])
            cylinder(d = bolt_hole_diameter, h = effective_knob_height + 2, $fn = 64);

        // --- 3. HEX HEAD SOCKET RECESS ---
        translate([0, 0, shaft_hole_depth])
            cylinder(r = hex_r, h = effective_knob_height - shaft_hole_depth + 1, $fn = 6);

        // --- 4. ERGONOMIC GRIP FLUTES (FINGER GROOVES) ---
        if (num_grooves > 0) {
            for (i = [0 : num_grooves - 1]) {
                rotate([0, 0, i * 360 / num_grooves])
                    translate([knob_max_diameter / 2 + groove_depth_offset, 0, knob_neck_height - 0.5])
                        // Grooves cut from top of neck to the top of the knob
                        cylinder(h = effective_knob_height - knob_neck_height + 1, r = groove_radius, $fn = 64);
            }
        }
    }
}

// Optional snap-fit cover cap for the hex head recess
module battery_knob_cap() {
    // Disk size to sit flush on top of the knob
    cap_outer_diameter = knob_max_diameter - 2 * top_bevel_size;
    cap_disk_height = 1.2;

    // Hex socket dimensions
    hex_w = hex_flat_width + 2 * hex_clearance;

    // Cap stem dimensions (slightly tighter fit for a firm press-fit)
    cap_stem_clearance = 0.05;
    cap_stem_w = hex_w - 2 * cap_stem_clearance;
    cap_stem_r = (cap_stem_w / 2) / cos(30);

    // Calculate how much free height is in the hex socket above the bolt head
    socket_free_depth = effective_knob_height - shaft_hole_depth - hex_head_height;
    // Set stem height to fit comfortably inside without hitting the bolt head
    cap_stem_height = max(1.5, socket_free_depth - 0.5);

    // Designed with the flat top printed directly on the build plate (support-free)
    union() {
        // A. Flat cover disk (sits on bed)
        cylinder(h = cap_disk_height, r = cap_outer_diameter / 2, $fn = 64);

        // B. Hexagonal press-fit stem pointing upwards
        translate([0, 0, cap_disk_height])
            cylinder(r = cap_stem_r, h = cap_stem_height, $fn = 6);
    }
}
